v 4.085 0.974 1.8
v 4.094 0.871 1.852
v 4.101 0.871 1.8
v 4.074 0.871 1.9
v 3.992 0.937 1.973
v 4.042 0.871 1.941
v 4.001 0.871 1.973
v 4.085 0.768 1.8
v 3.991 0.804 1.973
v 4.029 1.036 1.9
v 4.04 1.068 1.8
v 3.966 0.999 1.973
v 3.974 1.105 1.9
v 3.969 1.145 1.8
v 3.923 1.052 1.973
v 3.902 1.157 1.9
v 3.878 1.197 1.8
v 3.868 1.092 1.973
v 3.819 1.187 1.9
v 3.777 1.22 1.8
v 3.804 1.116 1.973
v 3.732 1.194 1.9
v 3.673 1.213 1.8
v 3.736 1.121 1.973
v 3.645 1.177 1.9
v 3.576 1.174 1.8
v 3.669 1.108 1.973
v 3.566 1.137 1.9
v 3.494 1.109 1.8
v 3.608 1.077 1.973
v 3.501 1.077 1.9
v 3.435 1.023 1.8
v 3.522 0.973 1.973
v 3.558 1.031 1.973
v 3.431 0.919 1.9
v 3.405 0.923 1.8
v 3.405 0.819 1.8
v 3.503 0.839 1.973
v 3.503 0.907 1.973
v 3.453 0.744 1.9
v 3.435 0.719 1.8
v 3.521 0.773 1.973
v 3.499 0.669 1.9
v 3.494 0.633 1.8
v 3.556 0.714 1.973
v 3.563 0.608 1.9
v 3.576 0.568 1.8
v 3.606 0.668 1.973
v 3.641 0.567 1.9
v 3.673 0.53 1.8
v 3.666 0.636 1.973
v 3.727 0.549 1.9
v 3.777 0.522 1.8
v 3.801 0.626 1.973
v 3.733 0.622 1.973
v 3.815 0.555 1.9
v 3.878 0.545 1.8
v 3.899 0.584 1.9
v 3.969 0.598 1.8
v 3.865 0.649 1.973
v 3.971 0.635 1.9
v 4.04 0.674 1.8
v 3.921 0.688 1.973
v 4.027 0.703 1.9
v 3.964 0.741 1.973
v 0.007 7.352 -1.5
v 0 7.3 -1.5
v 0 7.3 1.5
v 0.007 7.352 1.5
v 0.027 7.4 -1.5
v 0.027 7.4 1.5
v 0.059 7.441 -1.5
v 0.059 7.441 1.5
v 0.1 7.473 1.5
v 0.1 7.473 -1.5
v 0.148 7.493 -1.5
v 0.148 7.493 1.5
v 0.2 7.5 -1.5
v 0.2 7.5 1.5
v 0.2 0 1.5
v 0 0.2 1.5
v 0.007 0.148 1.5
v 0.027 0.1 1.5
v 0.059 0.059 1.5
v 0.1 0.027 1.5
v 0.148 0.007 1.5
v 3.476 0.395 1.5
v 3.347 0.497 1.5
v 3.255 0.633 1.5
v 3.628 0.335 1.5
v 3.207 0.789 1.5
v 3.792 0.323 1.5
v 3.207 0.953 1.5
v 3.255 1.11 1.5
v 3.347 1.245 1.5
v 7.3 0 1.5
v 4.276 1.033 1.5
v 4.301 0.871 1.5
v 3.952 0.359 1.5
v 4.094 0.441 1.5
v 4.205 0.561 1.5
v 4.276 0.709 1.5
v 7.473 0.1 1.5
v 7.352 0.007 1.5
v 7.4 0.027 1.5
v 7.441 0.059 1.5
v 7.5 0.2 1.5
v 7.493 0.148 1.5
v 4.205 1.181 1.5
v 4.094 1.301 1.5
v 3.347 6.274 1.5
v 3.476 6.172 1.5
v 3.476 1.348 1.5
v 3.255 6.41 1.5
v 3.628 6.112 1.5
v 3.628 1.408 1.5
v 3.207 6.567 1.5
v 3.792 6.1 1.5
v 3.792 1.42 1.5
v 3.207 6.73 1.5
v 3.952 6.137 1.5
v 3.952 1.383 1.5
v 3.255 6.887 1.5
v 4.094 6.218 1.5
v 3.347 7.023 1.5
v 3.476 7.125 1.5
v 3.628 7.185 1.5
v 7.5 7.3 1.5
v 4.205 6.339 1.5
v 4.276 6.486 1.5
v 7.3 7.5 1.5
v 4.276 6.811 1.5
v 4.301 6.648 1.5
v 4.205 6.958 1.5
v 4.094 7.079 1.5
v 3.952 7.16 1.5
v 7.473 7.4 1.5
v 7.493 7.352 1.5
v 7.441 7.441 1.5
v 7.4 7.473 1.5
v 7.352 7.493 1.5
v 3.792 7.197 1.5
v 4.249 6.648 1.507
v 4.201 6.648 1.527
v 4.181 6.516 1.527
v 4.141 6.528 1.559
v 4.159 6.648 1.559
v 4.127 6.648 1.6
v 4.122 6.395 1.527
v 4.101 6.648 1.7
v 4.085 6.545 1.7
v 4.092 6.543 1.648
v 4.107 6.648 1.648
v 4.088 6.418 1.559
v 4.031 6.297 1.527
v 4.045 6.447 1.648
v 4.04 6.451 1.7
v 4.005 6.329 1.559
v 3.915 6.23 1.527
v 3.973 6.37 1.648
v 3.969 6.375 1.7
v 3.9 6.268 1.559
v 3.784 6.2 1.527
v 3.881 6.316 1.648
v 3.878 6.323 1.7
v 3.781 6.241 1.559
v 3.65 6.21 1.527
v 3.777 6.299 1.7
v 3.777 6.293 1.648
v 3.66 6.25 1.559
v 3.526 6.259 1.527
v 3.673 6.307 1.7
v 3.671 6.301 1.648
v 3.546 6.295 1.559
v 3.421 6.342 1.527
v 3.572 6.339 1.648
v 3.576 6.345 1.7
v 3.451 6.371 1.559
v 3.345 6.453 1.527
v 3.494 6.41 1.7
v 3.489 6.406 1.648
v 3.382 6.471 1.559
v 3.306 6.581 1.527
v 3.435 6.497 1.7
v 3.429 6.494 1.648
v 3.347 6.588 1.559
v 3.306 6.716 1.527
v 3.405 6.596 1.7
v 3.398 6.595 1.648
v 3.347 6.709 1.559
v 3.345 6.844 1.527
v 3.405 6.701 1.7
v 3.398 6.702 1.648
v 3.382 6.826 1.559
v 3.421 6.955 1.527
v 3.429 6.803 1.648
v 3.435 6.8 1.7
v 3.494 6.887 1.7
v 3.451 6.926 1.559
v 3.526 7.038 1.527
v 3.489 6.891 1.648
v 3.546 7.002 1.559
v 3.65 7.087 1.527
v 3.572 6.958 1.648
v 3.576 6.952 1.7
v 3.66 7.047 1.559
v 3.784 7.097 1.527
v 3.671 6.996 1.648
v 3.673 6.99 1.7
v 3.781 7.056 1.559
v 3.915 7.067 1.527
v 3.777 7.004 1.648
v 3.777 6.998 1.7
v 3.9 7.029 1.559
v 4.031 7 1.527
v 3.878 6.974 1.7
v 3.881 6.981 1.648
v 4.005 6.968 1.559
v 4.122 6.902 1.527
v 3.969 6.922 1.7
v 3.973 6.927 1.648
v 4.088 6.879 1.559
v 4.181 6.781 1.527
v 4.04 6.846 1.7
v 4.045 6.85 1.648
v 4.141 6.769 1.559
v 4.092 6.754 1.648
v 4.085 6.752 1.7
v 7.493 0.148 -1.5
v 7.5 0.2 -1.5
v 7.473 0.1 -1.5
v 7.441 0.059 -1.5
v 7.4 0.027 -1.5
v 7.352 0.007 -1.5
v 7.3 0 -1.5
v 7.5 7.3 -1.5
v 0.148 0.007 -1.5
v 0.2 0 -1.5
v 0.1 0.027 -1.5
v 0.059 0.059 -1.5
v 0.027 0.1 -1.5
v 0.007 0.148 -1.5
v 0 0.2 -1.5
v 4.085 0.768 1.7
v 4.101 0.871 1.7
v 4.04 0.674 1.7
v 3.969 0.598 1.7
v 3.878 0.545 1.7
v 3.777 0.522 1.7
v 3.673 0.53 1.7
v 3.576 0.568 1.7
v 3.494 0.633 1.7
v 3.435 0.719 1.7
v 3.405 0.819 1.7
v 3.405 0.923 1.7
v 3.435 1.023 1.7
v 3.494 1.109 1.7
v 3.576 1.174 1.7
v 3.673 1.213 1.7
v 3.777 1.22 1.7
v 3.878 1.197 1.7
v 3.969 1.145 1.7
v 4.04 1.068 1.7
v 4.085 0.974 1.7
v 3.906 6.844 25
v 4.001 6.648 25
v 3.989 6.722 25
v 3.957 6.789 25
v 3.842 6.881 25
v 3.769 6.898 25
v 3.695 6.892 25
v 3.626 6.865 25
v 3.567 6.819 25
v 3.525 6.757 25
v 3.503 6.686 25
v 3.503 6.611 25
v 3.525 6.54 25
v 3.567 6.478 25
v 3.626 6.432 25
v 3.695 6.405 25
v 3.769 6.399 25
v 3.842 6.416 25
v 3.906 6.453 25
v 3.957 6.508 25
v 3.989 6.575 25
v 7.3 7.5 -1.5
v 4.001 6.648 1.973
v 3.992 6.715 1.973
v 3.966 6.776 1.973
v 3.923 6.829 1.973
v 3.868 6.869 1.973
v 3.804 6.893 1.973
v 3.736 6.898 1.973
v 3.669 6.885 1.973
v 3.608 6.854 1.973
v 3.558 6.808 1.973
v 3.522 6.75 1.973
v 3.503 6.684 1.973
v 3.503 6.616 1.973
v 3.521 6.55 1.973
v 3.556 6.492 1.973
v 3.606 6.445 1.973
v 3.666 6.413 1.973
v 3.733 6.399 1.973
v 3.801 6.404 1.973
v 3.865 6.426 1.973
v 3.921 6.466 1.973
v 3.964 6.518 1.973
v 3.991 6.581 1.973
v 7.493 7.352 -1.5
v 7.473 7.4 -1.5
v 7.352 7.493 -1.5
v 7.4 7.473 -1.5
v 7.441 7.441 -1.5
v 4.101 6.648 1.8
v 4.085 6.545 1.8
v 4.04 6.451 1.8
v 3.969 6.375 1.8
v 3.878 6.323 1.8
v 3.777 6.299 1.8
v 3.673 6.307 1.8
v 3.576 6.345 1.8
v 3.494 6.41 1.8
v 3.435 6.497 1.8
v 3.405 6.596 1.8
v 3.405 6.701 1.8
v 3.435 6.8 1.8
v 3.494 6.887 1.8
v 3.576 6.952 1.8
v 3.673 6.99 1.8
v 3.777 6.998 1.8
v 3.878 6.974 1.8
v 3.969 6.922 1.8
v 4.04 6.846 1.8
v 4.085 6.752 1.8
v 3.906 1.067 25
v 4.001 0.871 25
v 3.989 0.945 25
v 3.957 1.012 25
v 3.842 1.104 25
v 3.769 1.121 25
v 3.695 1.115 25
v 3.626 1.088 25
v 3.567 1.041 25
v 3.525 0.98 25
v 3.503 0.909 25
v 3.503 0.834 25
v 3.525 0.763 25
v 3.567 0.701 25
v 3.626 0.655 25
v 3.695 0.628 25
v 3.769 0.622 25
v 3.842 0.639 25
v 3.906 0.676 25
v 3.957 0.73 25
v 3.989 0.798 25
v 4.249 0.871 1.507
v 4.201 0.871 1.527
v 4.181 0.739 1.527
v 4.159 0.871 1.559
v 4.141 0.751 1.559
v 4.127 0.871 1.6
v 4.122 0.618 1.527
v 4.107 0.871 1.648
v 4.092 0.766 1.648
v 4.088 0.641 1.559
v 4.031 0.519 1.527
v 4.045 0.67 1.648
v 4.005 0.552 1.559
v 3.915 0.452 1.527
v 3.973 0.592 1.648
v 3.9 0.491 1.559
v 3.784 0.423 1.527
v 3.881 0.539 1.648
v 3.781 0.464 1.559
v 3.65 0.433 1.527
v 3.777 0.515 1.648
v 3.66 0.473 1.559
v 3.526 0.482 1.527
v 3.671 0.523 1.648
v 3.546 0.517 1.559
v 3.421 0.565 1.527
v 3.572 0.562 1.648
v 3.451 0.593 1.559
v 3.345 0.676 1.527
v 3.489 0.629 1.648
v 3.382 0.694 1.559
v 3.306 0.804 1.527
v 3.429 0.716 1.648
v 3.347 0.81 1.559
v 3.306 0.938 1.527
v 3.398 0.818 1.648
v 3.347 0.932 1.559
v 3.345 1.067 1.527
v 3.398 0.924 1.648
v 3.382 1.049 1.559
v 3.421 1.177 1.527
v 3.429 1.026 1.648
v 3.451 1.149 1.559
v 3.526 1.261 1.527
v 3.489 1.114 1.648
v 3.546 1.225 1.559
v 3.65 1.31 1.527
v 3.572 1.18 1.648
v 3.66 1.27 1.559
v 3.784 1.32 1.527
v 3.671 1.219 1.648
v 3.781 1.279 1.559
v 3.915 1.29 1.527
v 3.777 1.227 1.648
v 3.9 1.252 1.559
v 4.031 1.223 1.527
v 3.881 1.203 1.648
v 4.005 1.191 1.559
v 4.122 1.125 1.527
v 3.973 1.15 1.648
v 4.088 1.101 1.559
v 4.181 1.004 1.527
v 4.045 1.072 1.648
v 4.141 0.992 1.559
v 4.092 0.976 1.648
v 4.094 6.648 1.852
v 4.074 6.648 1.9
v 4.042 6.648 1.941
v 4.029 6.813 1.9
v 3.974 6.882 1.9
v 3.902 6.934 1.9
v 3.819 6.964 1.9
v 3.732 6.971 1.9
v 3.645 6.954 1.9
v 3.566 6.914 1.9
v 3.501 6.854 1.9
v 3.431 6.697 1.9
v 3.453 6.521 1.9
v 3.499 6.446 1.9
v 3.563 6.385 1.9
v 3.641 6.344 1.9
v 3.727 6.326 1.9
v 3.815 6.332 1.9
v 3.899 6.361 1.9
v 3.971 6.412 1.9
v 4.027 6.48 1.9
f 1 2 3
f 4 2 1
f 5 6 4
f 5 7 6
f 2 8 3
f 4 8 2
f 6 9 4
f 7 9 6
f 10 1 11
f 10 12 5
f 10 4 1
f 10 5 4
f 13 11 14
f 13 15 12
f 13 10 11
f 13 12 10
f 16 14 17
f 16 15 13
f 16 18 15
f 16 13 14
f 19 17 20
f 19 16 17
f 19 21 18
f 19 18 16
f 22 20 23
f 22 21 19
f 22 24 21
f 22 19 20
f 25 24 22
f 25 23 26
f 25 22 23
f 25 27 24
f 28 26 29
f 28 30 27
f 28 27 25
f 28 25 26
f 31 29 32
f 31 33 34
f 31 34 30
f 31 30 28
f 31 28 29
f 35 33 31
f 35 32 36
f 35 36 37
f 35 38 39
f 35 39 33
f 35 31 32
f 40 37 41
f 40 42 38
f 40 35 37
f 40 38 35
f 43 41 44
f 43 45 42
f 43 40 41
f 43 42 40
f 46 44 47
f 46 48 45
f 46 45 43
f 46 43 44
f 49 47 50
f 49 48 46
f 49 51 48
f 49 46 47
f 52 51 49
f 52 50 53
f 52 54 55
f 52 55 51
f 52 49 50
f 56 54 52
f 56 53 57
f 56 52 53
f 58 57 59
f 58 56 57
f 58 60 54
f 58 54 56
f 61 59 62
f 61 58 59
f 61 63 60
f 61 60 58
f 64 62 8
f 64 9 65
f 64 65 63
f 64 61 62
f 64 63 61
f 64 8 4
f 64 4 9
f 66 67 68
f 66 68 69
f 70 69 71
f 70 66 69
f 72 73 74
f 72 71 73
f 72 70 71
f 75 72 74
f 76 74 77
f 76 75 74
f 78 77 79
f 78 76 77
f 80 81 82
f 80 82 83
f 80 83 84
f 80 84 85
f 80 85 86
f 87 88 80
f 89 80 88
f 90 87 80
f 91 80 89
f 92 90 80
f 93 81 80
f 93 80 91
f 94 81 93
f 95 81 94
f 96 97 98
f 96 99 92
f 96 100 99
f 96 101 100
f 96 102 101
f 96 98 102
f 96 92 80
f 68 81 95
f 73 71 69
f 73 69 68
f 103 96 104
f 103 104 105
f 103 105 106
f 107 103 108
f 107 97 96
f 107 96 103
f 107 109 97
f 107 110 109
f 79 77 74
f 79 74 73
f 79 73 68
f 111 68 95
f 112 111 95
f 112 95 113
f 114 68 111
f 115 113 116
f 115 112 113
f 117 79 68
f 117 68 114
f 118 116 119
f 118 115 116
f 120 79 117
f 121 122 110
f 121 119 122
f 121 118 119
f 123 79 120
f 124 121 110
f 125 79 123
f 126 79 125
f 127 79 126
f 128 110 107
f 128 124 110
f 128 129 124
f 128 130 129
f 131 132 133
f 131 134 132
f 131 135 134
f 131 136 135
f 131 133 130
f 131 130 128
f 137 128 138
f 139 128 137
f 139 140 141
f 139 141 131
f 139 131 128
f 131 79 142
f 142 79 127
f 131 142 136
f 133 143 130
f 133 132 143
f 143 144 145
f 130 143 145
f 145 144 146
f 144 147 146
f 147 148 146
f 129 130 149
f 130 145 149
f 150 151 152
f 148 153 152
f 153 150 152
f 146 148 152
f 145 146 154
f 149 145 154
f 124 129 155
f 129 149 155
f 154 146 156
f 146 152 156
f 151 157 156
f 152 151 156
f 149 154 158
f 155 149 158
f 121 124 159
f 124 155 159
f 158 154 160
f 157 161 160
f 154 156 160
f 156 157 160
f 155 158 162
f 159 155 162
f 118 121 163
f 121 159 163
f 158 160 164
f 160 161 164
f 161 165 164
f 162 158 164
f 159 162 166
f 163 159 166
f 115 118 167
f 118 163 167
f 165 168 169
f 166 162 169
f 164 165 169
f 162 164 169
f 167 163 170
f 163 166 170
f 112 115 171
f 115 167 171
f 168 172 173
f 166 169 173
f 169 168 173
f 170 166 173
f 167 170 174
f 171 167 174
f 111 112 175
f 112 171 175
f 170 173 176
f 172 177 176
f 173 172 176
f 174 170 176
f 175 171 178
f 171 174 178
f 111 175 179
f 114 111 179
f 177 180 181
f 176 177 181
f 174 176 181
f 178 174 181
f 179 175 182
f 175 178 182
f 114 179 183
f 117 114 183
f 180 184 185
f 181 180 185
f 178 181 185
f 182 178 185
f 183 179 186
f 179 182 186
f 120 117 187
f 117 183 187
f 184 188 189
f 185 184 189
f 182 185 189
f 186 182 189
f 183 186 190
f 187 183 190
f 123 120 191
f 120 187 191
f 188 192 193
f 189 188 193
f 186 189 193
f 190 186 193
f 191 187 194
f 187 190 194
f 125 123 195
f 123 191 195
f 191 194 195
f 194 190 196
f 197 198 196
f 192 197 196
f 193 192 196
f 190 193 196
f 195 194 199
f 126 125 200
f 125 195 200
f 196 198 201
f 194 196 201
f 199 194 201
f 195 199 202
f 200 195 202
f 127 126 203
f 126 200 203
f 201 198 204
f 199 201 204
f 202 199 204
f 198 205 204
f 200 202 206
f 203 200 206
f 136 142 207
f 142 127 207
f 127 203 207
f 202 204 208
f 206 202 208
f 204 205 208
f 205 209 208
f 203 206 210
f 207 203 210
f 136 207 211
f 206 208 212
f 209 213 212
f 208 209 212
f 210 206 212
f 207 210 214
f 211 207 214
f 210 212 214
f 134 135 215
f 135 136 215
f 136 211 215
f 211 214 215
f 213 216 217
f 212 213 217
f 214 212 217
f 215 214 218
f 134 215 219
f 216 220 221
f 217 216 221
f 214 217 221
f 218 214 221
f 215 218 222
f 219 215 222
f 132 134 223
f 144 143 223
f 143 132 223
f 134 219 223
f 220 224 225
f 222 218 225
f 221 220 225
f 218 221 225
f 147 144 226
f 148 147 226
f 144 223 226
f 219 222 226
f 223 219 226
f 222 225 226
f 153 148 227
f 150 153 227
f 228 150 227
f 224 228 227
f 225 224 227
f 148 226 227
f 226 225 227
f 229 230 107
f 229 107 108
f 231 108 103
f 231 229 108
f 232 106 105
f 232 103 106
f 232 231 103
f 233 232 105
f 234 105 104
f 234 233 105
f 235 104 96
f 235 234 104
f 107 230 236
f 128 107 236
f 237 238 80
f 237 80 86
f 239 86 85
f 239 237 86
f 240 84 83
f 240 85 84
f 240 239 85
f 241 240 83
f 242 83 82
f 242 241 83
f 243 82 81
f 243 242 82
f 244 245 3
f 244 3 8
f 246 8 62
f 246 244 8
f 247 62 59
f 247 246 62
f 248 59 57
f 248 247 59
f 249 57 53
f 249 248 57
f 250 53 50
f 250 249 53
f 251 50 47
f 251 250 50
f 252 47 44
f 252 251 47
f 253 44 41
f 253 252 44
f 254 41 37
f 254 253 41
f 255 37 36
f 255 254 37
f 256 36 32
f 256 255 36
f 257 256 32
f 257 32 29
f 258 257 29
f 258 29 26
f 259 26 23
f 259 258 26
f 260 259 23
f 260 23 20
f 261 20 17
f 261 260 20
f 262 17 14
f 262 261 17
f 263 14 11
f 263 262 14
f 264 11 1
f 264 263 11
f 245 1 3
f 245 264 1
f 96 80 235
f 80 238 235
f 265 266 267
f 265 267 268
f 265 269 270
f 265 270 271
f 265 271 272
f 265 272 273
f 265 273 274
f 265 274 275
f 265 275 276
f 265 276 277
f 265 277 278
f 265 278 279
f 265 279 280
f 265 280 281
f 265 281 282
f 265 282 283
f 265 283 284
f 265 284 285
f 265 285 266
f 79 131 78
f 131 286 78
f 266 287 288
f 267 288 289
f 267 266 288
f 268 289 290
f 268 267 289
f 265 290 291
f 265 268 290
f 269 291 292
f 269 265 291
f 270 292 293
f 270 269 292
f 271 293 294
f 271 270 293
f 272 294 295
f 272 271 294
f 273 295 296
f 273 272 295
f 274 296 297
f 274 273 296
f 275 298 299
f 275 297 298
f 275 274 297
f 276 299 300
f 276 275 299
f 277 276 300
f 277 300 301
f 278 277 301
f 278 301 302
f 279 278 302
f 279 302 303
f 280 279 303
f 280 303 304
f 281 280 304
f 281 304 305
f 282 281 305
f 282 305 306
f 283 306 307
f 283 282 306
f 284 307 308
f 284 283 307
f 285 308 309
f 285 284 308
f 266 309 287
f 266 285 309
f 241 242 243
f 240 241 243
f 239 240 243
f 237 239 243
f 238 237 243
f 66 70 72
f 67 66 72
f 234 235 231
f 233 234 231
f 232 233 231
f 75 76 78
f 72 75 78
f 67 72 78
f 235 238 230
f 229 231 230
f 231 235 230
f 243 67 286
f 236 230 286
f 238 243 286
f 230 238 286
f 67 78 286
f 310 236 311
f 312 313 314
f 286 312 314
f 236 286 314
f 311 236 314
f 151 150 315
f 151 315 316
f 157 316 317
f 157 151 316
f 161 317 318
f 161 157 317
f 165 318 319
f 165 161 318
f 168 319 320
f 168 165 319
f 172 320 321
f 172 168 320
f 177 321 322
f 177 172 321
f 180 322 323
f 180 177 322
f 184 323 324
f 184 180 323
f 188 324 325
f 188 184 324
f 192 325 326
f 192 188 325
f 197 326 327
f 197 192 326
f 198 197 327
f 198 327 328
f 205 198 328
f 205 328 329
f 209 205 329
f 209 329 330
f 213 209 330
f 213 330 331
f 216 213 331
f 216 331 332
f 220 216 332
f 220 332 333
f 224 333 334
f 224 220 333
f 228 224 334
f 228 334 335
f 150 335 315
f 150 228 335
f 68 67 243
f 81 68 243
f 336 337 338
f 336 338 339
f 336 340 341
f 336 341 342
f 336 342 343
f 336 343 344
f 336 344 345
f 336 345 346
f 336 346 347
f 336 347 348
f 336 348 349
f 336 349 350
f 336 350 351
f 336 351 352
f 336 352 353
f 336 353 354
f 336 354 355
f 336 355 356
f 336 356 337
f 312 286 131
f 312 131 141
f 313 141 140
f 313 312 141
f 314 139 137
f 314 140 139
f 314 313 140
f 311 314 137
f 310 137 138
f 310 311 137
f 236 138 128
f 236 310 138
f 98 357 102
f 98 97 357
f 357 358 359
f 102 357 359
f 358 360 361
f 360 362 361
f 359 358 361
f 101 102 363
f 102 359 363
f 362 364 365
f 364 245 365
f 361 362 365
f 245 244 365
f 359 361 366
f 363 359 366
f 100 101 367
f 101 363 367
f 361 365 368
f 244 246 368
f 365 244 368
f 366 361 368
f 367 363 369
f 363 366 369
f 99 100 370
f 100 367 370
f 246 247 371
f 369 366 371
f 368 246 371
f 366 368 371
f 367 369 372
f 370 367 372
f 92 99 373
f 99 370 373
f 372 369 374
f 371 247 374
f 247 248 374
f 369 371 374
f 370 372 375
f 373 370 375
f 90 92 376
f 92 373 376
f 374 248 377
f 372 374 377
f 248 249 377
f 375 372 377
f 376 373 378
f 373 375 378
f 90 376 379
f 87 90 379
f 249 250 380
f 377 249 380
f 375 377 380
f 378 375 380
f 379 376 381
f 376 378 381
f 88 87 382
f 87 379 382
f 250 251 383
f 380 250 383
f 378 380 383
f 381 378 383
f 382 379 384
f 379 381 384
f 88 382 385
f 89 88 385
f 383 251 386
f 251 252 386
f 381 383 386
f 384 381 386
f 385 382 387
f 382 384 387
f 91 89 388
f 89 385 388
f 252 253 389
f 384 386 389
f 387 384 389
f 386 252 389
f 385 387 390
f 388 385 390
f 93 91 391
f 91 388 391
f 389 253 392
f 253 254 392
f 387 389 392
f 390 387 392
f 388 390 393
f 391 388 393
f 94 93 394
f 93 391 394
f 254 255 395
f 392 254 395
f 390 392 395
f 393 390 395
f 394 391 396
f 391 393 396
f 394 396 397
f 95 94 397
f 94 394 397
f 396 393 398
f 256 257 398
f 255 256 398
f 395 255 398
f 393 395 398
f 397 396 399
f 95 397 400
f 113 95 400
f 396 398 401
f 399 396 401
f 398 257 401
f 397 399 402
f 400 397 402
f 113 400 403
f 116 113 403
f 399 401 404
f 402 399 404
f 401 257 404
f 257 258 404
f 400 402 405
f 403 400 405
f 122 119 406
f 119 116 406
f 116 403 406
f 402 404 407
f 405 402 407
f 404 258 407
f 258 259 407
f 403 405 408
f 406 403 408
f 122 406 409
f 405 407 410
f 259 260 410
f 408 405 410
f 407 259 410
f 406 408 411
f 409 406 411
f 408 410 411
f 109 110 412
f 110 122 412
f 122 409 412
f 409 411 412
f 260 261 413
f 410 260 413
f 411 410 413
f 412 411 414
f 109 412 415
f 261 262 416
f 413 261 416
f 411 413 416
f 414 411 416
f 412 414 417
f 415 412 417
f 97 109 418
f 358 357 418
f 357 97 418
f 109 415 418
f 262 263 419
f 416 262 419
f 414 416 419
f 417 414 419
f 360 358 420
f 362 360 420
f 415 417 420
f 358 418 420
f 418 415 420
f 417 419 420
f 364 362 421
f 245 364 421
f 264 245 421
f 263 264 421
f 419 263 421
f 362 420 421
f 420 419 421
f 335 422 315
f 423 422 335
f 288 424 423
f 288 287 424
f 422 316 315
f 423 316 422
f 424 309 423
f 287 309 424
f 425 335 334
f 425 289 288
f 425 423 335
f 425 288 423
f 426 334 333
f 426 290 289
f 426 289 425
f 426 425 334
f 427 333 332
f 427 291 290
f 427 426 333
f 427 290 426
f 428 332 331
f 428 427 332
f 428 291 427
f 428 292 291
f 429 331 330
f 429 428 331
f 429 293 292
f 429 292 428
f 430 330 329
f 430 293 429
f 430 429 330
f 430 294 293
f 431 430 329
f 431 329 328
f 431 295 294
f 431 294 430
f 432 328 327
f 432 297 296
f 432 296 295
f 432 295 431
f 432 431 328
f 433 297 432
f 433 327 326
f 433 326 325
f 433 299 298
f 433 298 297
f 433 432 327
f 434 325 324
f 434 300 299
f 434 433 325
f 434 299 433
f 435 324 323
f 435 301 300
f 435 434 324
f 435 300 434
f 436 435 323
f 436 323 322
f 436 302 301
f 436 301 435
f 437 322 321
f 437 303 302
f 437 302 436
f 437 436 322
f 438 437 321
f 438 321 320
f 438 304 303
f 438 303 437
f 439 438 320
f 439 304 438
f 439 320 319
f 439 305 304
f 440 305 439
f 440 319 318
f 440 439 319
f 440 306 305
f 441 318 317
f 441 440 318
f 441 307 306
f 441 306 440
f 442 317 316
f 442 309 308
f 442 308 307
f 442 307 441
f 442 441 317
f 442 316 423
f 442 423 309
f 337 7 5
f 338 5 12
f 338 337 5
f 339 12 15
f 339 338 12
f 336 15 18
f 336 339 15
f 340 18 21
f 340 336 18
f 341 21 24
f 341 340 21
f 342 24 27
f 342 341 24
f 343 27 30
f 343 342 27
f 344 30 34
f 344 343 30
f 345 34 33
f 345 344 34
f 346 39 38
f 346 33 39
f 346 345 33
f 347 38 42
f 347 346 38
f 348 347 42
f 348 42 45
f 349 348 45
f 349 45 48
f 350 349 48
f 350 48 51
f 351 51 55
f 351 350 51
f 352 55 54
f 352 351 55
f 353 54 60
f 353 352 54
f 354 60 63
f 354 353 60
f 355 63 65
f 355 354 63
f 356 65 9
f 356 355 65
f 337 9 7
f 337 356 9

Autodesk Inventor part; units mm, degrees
ref_plane "YZ Plane" through (0, 0, 0) normal (1, 0, 0) x (0, 1, 0)
ref_plane "XZ Plane" through (0, 0, 0) normal (0, 1, 0) x (-1, 0, 0)
ref_plane "XY Plane" through (0, 0, 0) normal (0, 0, 1) x (1, 0, 0)
sketch "Sketch1" plane through (0, 0, 0) normal (0, 0, 1) x (1, 0, 0)
  line L0 (7.3, 7.5) -> (0.2, 7.5)
  line L1 (0, 7.3) -> (0, 0.2)
  line L2 (0.2, 0) -> (7.3, 0)
  line L3 (7.5, 0.2) -> (7.5, 7.3)
  arc A0 (7.5, 7.3) -> (7.3, 7.5) centre (7.3, 7.3) ccw
  arc A1 (0.2, 7.5) -> (0, 7.3) centre (0.2, 7.3) ccw
  arc A2 (0, 0.2) -> (0.2, 0) centre (0.2, 0.2) ccw
  arc A3 (7.3, 0) -> (7.5, 0.2) centre (7.3, 0.2) ccw
  point P0 (0, 0)
  point P1 (0, 7.5)
  point P2 (7.5, 0)
  dimension "d0" = 7.5
  dimension "d1" = 7.5
  dimension "d2" = 0.2
extrude "Extrusion1" add sketch "Sketch1" along normal mid plane 3
sketch "Sketch3" plane through (0, 0, 0) normal (0, 0, 1) x (1, 0, 0)
  line L0 (0, 7.3) -> (0, 0.2) projected
  line L1 (1.4869, 3.75) -> (1.4869, 1.25)
  line L2 (1.4869, 1.25) -> (5.2369, 1.25)
  line L3 (1.4869, 3.75) -> (1.4869, 6.25)
  line L4 (1.4869, 6.25) -> (5.2369, 6.25)
  line L5 (1.4869, 1.25) -> (0, 1.25)
  line L6 (0, 1.25) -> (3.75, 1.25)
  line L7 (3.75, 1.25) -> (3.75, 6.25)
  line L8 (3.75, 6.25) -> (0, 6.25)
  point P0 (0, 0)
  dimension "d7" = 2.5
  dimension "d8" = 3.75
  dimension "d9" = 2.5
  dimension "d10" = 3.75
  dimension "d11" = 3.75
  dimension "d12" = 5
  dimension "d13" = 3.75
ref_plane "Work Plane1" through (3.75, 0.2, 1.5) normal (-1, 0, 0) x (0, 0, 1)
sketch "Sketch4" plane through (3.75, 0.2, 1.5) normal (-1, 0, 0) x (0, 0, 1)
  line L0 (-1.5, 6.4485) -> (23.5, 6.4485)
  line L1 (-1.5, 0.671) -> (23.5, 0.671)
  point P0 (-1.5, -0.2)
  dimension "d15" = 25
  dimension "d17" = 25
ref_plane "Work Plane2" through (0, 0, 1.5) normal (0, 0, 1) x (1, 0, 0)
sketch "Sketch6" plane through (0, 0, 1.5) normal (0, 0, 1) x (1, 0, 0)
  circle A0 centre (3.7506, 6.6485) radius 0.35
  circle A1 centre (3.7506, 0.8713) radius 0.35
  point P0 (0, 0)
  dimension "d22" = 0.7
  dimension "d27" = 0.7
extrude "Extrusion3" add sketch "Sketch6" along normal blind 0.5 contours A0
fillet "Fillet3" radius 0.2 2 edges at (3.4006, 6.6485, 1.5) (3.4006, 6.6485, 2)
extrude "Extrusion4" add sketch "Sketch6" along normal blind 0.5 contours A1
fillet "Fillet4" radius 0.2 2 edges at (3.4006, 0.8713, 2) (3.4006, 0.8713, 1.5)
ref_plane "Work Plane3" through (3.7506, 0.8713, 2) normal (0, 0, 1) x (1, 0, 0)
ref_plane "Work Plane4" through (3.7506, 6.6485, 2) normal (0, 0, 1) x (1, 0, 0)
sketch "Sketch7" plane through (3.7506, 0.8713, 2) normal (0, 0, 1) x (1, 0, 0)
  circle A0 centre (0, 0) radius 0.25
  point P0 (-3.7506, -0.8713)
  dimension "d33" = 0.5
sweep "Sweep1" add profiles "Sketch7" path "Sketch4" path curves L1
sketch "Sketch8" plane through (3.7506, 6.6485, 2) normal (0, 0, 1) x (1, 0, 0)
  circle A0 centre (0, 0) radius 0.25
  point P0 (-3.7506, -6.6485)
  dimension "d36" = 0.5
sweep "Sweep2" add profiles "Sketch8" path "Sketch4" path curves L0
equation "\"BendRadius\" = Thickness"
equation "\"BendReliefWidth\" = Thickness"
equation "\"BendReliefDepth\" = 0.5 * Thickness"
equation "\"CornerReliefSize\" = 4 * Thickness"
equation "\"MinimumRemnant\" = 2 * Thickness"
equation "\"TransitionRadius\" = BendRadius"
equation "\"JacobiRadiusSize\" = BendRadius"
equation "\"GapSize\" = Thickness"
equation "\"Thickness\" = 3.048"
properties part number "A60"
